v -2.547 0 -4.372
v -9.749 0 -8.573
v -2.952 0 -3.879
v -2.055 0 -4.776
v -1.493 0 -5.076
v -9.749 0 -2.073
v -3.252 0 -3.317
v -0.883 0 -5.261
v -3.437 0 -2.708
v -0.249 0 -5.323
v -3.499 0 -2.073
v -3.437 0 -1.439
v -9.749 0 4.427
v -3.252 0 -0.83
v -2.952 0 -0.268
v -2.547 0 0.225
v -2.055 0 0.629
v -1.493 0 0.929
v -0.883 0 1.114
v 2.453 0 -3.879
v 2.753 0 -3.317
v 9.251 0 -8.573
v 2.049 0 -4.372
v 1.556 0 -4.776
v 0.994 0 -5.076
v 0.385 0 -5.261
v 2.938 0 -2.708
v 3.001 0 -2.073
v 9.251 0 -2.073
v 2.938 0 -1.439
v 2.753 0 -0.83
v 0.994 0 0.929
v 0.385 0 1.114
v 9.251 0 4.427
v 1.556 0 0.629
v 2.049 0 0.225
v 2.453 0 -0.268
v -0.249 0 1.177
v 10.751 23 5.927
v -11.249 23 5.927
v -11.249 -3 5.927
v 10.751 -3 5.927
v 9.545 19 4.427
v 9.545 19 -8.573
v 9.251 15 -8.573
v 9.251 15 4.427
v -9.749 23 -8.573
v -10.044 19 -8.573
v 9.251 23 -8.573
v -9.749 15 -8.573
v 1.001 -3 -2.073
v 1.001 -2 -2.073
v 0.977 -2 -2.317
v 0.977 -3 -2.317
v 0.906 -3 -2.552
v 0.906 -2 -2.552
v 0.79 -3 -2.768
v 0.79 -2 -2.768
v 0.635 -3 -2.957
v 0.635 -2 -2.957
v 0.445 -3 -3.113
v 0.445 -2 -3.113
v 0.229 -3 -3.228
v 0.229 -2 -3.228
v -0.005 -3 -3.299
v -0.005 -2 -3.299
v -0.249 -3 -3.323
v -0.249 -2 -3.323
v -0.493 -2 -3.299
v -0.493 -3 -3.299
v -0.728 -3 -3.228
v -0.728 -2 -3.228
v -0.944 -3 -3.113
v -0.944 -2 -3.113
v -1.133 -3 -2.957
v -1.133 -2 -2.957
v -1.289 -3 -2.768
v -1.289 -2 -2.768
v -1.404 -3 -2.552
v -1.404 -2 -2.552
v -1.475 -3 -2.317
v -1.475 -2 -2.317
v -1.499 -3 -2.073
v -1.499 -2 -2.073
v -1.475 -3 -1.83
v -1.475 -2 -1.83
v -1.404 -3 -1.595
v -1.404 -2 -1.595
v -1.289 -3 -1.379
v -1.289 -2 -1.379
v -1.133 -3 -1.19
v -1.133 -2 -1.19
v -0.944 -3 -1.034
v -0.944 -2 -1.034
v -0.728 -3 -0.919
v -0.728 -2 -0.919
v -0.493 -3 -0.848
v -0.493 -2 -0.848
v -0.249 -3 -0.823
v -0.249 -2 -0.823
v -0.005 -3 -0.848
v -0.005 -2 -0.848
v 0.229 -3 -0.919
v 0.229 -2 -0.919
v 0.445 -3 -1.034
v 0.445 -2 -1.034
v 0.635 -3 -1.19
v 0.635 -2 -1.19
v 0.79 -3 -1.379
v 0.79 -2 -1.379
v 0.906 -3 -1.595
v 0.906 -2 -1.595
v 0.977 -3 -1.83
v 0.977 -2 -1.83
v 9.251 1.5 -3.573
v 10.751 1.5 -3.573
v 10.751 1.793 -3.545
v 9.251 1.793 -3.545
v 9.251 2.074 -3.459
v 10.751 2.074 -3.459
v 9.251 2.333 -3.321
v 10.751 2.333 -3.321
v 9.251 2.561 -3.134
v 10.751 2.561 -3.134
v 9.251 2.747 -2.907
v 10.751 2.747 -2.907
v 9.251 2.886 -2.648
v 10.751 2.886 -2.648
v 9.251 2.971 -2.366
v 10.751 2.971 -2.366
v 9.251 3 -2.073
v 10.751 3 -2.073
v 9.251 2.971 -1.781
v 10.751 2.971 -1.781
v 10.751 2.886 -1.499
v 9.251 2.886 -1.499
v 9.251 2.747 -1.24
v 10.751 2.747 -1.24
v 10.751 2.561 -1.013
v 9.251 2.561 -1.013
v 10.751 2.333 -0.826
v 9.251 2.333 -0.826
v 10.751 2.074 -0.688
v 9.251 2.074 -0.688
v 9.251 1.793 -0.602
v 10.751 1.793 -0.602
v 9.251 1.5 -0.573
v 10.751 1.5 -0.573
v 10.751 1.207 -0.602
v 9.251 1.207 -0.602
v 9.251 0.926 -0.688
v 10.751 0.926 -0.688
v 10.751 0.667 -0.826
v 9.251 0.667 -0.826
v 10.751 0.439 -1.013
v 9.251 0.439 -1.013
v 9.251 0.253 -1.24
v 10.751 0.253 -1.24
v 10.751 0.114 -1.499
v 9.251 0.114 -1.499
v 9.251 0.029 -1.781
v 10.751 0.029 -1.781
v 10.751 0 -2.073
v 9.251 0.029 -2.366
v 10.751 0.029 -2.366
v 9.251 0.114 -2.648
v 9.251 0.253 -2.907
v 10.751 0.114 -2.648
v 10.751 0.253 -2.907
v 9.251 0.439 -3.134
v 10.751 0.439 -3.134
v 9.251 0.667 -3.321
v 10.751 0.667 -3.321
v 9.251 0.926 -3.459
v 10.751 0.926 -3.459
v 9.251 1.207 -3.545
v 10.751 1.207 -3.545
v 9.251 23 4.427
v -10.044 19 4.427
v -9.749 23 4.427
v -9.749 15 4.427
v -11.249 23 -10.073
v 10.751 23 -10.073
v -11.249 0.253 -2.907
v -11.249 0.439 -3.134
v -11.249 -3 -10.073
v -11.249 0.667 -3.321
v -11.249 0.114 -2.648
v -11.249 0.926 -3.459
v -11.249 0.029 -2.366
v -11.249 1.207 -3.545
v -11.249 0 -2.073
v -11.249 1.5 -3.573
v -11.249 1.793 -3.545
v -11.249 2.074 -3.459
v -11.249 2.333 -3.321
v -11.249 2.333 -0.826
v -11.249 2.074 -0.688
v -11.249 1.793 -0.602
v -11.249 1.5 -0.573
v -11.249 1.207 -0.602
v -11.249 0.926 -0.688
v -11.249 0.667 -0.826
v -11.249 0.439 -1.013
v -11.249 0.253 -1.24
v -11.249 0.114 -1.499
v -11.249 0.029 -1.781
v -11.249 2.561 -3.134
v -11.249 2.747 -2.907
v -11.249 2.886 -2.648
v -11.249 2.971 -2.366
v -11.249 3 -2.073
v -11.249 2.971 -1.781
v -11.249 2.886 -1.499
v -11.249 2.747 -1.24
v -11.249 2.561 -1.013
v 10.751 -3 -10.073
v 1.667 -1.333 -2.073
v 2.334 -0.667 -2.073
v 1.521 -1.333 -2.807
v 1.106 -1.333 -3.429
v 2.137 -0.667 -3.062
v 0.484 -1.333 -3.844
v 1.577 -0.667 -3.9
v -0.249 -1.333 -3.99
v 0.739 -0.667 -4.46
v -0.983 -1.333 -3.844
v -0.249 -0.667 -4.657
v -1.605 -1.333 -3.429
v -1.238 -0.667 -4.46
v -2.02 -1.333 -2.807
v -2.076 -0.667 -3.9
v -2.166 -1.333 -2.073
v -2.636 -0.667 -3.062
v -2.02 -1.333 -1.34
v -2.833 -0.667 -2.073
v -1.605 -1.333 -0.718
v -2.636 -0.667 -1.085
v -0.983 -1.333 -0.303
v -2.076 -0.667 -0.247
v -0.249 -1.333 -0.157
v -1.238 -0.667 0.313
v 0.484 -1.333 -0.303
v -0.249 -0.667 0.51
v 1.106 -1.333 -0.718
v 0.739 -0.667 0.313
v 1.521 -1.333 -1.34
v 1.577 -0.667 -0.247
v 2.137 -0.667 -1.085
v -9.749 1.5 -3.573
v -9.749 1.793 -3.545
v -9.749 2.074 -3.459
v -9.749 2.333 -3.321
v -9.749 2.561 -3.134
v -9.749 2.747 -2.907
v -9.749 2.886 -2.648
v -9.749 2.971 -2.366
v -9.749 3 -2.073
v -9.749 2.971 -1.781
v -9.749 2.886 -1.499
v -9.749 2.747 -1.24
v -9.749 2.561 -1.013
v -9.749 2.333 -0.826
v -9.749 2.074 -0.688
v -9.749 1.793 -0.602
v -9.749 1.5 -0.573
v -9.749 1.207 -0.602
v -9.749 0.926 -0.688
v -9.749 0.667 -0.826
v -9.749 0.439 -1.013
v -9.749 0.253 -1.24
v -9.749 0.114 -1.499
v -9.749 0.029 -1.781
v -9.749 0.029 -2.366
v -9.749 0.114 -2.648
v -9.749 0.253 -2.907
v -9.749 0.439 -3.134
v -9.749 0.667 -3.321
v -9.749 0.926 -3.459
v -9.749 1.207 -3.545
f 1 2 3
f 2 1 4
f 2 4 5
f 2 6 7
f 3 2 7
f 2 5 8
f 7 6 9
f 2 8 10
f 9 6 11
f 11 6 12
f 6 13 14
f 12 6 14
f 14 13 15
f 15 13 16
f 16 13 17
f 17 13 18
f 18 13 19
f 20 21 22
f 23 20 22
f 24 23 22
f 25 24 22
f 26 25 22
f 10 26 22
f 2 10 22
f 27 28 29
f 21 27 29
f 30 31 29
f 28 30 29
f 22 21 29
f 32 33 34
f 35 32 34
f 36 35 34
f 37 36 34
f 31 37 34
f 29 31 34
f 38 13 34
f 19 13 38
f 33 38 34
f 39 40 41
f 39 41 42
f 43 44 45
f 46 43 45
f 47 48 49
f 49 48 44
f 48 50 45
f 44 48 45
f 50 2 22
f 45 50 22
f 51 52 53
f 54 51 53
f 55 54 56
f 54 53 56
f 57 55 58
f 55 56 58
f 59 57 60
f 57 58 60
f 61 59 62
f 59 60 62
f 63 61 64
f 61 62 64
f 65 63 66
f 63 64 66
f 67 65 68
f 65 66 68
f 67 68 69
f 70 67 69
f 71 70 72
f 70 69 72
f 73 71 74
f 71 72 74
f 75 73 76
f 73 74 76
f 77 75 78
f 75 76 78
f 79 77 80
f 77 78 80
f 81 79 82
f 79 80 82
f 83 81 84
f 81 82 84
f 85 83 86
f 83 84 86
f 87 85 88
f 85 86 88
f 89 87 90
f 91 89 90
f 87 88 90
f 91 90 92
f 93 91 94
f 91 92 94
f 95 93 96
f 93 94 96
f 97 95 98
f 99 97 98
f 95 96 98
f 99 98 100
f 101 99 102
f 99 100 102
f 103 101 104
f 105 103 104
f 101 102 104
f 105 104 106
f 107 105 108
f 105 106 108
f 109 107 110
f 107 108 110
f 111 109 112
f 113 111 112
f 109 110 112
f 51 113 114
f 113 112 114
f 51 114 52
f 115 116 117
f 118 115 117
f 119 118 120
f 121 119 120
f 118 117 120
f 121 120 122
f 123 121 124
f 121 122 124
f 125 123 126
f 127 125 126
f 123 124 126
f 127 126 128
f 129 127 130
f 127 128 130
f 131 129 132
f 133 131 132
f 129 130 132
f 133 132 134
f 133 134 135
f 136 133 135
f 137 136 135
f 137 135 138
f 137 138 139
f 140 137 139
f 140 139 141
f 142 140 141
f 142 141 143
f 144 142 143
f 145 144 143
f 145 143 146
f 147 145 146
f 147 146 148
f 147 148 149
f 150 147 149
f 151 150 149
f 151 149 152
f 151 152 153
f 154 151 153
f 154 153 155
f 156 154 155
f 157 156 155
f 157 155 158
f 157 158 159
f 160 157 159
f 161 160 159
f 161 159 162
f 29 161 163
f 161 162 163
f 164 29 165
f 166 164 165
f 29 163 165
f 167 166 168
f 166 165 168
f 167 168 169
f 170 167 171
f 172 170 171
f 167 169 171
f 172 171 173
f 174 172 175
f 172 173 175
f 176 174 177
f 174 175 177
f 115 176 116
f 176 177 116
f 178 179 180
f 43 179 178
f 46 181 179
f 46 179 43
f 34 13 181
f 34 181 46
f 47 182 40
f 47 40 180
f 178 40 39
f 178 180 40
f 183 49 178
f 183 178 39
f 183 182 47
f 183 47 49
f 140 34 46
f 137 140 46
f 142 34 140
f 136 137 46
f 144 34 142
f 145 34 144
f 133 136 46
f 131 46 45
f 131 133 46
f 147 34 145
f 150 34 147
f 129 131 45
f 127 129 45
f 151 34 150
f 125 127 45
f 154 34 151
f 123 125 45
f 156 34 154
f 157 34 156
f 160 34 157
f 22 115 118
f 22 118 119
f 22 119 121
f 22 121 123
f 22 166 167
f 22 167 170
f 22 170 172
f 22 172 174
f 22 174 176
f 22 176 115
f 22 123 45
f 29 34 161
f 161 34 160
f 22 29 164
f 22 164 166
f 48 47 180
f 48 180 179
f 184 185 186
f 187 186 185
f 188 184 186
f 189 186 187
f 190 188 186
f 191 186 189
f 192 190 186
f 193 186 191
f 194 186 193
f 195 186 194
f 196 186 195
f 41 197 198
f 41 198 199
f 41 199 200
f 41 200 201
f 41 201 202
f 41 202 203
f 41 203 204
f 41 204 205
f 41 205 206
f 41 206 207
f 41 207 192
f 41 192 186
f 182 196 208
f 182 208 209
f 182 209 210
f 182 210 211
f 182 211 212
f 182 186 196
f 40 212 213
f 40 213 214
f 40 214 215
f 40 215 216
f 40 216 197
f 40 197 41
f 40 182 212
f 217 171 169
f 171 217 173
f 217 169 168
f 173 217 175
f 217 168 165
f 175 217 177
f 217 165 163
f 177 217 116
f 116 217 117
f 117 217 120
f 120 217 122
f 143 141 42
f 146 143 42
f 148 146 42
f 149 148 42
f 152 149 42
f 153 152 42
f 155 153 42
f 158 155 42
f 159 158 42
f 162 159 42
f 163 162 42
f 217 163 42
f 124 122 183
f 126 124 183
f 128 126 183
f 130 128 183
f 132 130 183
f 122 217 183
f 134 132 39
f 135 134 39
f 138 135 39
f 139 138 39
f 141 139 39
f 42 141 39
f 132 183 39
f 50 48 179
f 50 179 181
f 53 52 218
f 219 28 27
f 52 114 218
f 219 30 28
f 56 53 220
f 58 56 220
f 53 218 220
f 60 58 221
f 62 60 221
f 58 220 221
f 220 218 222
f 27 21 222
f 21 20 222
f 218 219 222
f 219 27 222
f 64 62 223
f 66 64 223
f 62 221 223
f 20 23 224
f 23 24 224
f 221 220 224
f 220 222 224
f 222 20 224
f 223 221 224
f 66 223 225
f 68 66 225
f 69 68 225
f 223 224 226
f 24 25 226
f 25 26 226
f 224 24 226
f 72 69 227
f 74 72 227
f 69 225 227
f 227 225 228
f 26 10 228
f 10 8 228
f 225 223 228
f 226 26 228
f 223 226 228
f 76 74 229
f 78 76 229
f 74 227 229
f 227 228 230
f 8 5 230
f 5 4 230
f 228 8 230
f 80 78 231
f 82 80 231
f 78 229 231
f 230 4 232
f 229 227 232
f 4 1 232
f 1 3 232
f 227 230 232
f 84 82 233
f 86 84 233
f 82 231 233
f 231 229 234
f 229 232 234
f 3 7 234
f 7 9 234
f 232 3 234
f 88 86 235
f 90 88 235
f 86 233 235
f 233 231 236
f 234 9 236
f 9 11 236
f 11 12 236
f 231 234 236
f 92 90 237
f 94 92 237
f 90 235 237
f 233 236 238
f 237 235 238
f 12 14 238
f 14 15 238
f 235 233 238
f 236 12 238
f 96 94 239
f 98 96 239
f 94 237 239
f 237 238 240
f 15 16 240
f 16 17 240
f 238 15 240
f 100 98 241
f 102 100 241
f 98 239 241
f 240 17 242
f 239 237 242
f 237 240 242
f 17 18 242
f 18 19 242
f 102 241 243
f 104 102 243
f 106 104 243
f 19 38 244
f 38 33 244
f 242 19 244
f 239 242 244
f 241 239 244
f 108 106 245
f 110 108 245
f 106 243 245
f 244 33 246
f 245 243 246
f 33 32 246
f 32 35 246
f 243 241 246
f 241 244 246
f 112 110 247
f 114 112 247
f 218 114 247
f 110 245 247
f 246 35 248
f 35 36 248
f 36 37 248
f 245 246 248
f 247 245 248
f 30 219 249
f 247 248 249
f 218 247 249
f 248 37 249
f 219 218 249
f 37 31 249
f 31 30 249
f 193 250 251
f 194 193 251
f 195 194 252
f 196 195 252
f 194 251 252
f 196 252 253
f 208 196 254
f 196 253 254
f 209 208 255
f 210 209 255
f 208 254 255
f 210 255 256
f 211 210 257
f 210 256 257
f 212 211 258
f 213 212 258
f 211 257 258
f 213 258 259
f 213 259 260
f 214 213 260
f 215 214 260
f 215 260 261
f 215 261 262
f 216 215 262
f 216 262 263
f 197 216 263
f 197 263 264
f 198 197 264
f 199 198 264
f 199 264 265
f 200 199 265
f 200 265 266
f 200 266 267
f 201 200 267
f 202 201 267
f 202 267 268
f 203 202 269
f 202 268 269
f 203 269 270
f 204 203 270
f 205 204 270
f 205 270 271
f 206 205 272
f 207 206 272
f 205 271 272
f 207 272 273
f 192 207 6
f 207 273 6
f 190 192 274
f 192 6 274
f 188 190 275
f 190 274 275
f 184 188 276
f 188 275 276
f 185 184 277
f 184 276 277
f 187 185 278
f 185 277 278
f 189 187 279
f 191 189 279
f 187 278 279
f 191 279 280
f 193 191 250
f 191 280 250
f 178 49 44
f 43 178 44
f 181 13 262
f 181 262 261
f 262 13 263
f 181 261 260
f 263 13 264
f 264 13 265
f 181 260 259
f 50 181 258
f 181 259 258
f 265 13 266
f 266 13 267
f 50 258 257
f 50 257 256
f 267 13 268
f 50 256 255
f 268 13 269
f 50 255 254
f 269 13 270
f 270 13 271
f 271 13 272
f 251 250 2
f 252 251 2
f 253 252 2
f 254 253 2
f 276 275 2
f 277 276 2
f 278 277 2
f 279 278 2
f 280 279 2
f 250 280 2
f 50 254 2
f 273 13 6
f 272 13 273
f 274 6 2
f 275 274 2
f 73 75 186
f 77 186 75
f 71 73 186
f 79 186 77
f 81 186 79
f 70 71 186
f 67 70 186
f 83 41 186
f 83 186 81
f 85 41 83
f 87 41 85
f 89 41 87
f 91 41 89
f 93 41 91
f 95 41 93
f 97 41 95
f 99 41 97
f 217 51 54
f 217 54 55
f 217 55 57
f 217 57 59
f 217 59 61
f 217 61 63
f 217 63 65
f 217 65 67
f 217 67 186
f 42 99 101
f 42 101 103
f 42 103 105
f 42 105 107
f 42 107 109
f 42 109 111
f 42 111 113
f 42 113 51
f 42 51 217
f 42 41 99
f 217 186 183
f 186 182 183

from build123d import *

# Parameters (mm, degrees)
SKETCH_1_W          = 22
SKETCH_1_H          = 16
SKETCH_1_W_2        = 19
SKETCH_1_H_2        = 13
EXTRUDE_1_DEPTH     = 23
SKETCH_2_W          = 22
SKETCH_2_H          = 16
EXTRUDE_2_DEPTH     = 3
SKETCH_3_R          = 1.25
CUT_EXTRUDE_1_DEPTH = 3
CHAMFER_1_SIZE      = 2
SKETCH_4_R          = 1.5
CUT_EXTRUDE_2_DEPTH = 28
CUT_EXTRUDE_3_DEPTH = 13


with BuildPart() as part:
    # Эскиз1 → Бобышка-Вытянуть1 (new body)
    with BuildSketch(Plane(origin=(0, 0, 0), x_dir=(1, 0, 0), z_dir=(0, 1, 0))):
        with Locations((-0.249343832, 2.073490814)):
            Rectangle(SKETCH_1_W, SKETCH_1_H)
        with Locations((-0.249343832, 2.073490814)):
            Rectangle(SKETCH_1_W_2, SKETCH_1_H_2, mode=Mode.SUBTRACT)
    extrude(amount=EXTRUDE_1_DEPTH)

    # Эскиз2 → Бобышка-Вытянуть2 (add)
    with BuildSketch(Plane.XZ):
        with Locations((-0.249343832, -2.073490814)):
            Rectangle(SKETCH_2_W, SKETCH_2_H)
    extrude(amount=EXTRUDE_2_DEPTH)

    # Эскиз3 → Вырез-Вытянуть1 (cut)
    with BuildSketch(Plane(origin=(0, 0, 0), x_dir=(1, 0, 0), z_dir=(0, 1, 0))):
        with Locations((-0.249343832, 2.073490814)):
            Circle(SKETCH_3_R)
    extrude(amount=-CUT_EXTRUDE_1_DEPTH, mode=Mode.SUBTRACT)

    # Фаска1
    chamfer_1_edges = [part.edges().sort_by_distance(p)[0] for p in [
        (-1.499343832, 0, -2.073490814),
    ]]
    chamfer(chamfer_1_edges, length=CHAMFER_1_SIZE)

    # Эскиз4 → Вырез-Вытянуть2 (cut)
    with BuildSketch(Plane(origin=(10.750656168, 0, 0), x_dir=(0, 0, -1), z_dir=(1, 0, 0))):
        with Locations((2.073490814, 1.5)):
            Circle(SKETCH_4_R)
    extrude(amount=-CUT_EXTRUDE_2_DEPTH, mode=Mode.SUBTRACT)

    # Эскиз5 → Вырез-Вытянуть3 (cut)
    with BuildSketch(Plane.XY.offset(-8.573490814)):
        Polygon((9.250656168, 23), (9.54509952, 19), (9.250656168, 15), align=None)
        Polygon((-10.043787184, 19), (-9.749343832, 15), (-9.749343832, 23), align=None)
    extrude(amount=CUT_EXTRUDE_3_DEPTH, mode=Mode.SUBTRACT)


solid = part.part
